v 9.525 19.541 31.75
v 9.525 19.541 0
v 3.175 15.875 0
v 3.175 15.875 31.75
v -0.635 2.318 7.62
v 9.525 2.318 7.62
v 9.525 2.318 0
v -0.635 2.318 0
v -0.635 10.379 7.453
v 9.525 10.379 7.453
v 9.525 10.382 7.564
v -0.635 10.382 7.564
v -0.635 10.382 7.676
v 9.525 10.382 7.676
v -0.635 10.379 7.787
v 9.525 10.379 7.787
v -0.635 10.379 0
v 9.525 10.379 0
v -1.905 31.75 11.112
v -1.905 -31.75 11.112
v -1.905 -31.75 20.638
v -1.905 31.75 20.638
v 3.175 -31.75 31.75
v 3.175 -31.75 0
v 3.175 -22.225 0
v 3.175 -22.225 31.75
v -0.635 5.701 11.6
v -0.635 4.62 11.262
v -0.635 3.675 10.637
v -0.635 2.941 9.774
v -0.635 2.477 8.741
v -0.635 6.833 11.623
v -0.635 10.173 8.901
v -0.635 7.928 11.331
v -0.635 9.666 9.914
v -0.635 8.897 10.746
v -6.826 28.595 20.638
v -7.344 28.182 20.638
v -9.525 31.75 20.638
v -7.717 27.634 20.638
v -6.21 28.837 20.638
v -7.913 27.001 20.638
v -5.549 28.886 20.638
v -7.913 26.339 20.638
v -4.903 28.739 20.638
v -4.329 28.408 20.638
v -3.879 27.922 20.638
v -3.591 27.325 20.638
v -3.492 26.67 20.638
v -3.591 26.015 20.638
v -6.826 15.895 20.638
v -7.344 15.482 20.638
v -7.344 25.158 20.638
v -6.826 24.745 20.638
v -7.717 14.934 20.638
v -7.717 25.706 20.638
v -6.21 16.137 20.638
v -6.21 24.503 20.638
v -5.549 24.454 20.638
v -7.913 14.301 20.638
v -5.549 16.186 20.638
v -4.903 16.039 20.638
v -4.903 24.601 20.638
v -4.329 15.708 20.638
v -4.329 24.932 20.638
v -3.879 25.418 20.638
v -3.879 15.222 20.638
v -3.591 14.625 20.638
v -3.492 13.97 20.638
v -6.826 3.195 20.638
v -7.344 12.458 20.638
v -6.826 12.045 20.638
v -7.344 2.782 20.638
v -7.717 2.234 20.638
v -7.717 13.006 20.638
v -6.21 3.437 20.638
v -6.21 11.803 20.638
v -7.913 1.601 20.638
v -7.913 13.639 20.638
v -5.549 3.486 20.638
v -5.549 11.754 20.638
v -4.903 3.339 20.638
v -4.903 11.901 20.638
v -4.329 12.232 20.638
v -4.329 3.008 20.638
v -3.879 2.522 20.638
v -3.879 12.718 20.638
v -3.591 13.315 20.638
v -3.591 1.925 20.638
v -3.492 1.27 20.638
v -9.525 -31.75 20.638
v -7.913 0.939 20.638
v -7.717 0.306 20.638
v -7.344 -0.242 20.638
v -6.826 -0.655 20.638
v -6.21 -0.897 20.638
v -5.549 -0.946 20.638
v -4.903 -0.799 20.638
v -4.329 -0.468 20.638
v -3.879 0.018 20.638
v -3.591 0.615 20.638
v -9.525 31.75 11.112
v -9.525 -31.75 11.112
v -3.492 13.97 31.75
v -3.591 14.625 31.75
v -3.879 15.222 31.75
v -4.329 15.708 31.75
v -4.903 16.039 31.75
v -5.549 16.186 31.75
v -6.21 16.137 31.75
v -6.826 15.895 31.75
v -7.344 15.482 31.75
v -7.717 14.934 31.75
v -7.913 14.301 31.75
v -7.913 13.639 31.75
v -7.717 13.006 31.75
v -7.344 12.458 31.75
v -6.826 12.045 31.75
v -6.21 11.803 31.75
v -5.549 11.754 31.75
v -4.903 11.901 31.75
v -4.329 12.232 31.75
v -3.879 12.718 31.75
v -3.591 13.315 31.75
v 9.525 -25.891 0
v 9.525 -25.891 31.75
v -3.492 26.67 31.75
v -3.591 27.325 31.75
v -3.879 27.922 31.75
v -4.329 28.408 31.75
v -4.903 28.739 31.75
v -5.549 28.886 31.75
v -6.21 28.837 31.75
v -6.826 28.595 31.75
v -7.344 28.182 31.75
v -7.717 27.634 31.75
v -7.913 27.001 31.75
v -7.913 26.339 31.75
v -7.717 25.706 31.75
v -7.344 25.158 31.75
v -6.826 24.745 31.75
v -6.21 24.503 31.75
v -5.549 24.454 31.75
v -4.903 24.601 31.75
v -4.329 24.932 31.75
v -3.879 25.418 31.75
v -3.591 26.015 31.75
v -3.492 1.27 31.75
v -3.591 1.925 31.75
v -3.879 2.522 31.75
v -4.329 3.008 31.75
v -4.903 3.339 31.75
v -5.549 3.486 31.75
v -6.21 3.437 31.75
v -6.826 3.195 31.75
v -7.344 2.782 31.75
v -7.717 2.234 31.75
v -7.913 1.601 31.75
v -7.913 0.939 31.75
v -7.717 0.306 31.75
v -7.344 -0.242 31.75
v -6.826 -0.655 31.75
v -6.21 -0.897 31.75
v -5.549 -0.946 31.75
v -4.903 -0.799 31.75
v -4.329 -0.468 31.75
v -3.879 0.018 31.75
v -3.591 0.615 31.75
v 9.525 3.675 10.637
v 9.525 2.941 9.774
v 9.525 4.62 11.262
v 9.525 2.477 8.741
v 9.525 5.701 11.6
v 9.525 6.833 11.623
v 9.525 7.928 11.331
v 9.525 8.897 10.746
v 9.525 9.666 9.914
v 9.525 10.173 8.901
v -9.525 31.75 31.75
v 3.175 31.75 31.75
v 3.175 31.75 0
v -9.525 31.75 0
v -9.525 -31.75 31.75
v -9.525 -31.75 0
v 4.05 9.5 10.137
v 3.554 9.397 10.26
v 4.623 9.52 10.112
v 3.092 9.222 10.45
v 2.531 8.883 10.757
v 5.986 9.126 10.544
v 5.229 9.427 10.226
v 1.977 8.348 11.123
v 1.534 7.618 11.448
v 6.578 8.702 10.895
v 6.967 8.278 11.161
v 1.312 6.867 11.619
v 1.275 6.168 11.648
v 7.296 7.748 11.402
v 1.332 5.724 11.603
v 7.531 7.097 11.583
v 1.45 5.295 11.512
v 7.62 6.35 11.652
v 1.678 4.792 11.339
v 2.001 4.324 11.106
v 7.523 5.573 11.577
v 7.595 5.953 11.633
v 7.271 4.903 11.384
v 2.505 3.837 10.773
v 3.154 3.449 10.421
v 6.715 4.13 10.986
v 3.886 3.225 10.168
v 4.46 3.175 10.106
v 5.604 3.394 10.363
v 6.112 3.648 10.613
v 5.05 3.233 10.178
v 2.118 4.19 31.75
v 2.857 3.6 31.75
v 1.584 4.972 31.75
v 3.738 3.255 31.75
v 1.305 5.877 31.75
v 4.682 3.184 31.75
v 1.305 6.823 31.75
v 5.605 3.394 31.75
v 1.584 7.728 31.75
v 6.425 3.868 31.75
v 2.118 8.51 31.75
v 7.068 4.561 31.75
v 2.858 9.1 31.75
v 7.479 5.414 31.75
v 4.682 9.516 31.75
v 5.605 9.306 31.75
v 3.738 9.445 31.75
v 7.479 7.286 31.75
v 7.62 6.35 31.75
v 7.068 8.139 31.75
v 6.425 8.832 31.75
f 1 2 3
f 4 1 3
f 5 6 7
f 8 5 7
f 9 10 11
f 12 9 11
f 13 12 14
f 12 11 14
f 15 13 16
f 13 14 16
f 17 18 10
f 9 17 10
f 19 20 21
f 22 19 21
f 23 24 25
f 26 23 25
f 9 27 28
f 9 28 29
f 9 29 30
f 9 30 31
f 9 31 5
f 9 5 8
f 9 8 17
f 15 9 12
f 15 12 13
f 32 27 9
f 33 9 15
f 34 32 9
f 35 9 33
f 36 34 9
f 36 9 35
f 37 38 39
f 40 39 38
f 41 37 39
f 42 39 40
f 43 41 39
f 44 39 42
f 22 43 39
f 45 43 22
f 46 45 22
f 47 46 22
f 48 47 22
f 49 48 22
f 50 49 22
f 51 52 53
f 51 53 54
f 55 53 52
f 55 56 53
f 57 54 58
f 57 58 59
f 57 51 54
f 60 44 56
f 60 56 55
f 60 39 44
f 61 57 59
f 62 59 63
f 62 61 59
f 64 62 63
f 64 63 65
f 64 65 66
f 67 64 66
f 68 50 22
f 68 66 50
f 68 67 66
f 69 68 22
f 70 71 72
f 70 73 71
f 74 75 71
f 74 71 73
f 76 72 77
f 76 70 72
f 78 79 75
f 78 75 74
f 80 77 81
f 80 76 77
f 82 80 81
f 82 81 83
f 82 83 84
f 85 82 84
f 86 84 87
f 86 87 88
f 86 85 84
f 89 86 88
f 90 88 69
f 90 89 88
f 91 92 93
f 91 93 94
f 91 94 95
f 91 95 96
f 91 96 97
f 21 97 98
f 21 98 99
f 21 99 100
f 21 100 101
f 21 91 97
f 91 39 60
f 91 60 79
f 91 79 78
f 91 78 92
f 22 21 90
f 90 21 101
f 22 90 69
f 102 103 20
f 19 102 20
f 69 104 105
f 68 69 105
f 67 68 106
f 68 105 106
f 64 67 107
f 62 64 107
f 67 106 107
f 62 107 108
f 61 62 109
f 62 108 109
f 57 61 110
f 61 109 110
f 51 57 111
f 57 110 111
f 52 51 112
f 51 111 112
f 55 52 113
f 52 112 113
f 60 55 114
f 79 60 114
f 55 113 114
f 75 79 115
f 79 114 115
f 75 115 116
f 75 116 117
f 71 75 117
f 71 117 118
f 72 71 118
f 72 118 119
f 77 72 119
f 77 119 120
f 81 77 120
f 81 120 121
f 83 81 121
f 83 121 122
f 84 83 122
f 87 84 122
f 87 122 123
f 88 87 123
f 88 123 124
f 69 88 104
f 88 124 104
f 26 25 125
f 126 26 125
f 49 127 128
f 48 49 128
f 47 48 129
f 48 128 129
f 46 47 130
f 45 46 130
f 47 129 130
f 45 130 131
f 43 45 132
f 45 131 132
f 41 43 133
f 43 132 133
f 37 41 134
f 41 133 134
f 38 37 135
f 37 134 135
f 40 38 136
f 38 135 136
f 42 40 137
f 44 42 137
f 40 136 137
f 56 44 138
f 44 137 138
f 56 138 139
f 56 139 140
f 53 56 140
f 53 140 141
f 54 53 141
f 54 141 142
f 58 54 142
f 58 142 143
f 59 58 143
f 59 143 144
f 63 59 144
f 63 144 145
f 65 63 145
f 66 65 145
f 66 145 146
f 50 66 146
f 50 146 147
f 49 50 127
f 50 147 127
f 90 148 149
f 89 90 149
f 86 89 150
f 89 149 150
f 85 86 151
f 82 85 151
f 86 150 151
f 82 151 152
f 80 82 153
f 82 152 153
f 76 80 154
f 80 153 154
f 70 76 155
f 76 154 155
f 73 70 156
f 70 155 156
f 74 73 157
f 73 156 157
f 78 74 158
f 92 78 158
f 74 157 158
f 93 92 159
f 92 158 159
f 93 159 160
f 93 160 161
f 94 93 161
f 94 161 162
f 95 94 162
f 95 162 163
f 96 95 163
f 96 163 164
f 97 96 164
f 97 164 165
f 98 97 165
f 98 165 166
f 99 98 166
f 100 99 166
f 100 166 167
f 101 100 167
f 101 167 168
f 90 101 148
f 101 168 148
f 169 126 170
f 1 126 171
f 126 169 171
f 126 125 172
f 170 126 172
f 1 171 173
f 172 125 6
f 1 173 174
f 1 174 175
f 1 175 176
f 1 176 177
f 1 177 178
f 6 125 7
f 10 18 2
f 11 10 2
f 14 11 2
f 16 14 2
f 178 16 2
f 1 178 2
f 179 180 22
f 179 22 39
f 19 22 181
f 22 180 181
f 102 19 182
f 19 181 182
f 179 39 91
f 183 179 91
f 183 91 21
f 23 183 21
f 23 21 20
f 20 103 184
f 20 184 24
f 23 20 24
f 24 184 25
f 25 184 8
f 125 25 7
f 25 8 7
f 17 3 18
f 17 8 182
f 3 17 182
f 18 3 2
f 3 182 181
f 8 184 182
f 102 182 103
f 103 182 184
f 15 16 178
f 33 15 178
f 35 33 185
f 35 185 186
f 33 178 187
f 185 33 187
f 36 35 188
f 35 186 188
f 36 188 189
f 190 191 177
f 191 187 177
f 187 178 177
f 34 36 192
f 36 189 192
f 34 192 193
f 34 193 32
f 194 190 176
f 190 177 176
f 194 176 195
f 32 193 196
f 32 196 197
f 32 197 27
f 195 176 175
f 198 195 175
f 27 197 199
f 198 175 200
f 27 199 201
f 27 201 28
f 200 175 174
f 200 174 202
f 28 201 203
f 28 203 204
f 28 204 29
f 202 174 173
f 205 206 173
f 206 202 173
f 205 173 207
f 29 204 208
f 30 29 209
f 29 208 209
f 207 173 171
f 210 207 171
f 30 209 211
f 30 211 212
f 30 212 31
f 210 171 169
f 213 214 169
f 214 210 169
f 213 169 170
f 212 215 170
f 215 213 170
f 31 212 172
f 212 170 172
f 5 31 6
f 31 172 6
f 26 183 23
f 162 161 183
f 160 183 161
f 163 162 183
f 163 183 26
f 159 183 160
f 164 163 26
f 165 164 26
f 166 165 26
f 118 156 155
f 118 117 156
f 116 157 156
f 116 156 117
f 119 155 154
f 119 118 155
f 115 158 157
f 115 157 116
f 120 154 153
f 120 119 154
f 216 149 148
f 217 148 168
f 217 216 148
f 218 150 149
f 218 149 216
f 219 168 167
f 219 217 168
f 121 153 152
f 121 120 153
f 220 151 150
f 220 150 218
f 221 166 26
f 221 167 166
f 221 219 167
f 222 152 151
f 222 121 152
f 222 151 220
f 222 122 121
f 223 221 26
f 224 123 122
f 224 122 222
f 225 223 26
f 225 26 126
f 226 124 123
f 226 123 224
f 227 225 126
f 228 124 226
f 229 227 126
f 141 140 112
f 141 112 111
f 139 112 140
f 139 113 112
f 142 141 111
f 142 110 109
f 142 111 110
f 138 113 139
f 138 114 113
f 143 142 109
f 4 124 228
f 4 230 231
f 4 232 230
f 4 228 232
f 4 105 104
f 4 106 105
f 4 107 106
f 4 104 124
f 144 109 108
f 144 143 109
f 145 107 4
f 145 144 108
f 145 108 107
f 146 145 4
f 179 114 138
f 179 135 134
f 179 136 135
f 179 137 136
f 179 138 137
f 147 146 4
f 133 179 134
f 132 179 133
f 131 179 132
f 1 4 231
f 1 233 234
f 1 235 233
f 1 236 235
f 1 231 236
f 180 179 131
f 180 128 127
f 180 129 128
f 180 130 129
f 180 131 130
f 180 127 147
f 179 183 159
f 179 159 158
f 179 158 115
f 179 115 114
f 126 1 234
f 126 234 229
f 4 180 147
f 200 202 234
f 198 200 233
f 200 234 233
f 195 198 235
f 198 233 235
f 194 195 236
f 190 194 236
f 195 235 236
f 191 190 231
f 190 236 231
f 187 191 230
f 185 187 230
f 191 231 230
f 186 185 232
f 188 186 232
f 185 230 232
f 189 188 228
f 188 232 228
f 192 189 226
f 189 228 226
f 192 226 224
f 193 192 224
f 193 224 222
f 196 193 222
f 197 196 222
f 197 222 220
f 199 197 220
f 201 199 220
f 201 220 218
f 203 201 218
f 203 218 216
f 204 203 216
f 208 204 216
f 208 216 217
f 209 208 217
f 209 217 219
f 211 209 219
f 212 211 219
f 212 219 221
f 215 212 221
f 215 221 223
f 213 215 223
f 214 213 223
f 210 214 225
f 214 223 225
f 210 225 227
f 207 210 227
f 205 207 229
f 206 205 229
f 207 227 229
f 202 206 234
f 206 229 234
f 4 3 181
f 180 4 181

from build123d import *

# Parameters (mm, degrees)
F1_DEPTH = 31.75
F2_W     = 15.24
F2_H     = 9.525
F3_DEPTH = 63.501
F4_R     = 2.2225
F5_DEPTH = 11.1125
F6_R     = 3.175
F7_DEPTH = 25.4
F9_DEPTH = 10.16


# Not quite as in the source:
# - a feature names something its author has since deleted; it is built from what else it names


with BuildPart() as f1:
    # F0 (on Top) → F1 (new body)
    with BuildSketch(Plane.XY):
        Polygon((3.175, 31.75), (-9.525, 31.75), (-9.525, -31.75), (3.175, -31.75), (3.175, -22.225), (3.175, 15.875), align=None)
        Polygon((9.525, 19.5411742094), (3.175, 15.875), (3.175, -22.225), (9.525, -25.8911742094), align=None)
    extrude(amount=F1_DEPTH)

    # F2 (on face) → F3 (cut, through all)
    with BuildSketch(Plane.XZ.offset(31.75)):
        with Locations((-9.525, 15.875)):
            Rectangle(F2_W, F2_H)
    extrude(amount=-F3_DEPTH, mode=Mode.SUBTRACT)

    # F4 (on face) → F5 (cut, through all)
    with BuildSketch(Plane.XY.offset(31.75)):
        with Locations((-5.715, 1.27)):
            Circle(F4_R)
        with Locations((-5.715, 13.97)):
            Circle(F4_R)
        with Locations((-5.715, 26.67)):
            Circle(F4_R)
    extrude(amount=-F5_DEPTH, mode=Mode.SUBTRACT)

    # F6 (on face) → F7 (cut)
    with BuildSketch(Plane.XY.offset(31.75)):
        with Locations((4.445, 6.35)):
            Circle(F6_R)
    extrude(amount=-F7_DEPTH, mode=Mode.SUBTRACT)

    # F8 (on face) → F9 (cut)
    with BuildSketch(Plane.YZ.offset(9.525)):
        with BuildLine():
            Line((10.3787716824, 7.7874478821), (10.3787716824, 7.4525521179))
            ThreePointArc((10.3787716824, 7.4525521179), (10.38225, 7.62), (10.3787716824, 7.7874478821))
        make_face()
        with BuildLine():
            Line((10.3787716824, 0), (10.3787716824, 7.4525521179))
            Line((10.3787716824, 7.4525521179), (10.3787716824, 7.7874478821))
            ThreePointArc((10.3787716824, 7.7874478821), (6.2662579975, 11.6513803268), (2.31775, 7.62))
            Line((2.31775, 7.62), (2.31775, 0))
            Line((2.31775, 0), (10.3787716824, 0))
        make_face()
    extrude(amount=-F9_DEPTH, mode=Mode.SUBTRACT)


solid = f1.part
